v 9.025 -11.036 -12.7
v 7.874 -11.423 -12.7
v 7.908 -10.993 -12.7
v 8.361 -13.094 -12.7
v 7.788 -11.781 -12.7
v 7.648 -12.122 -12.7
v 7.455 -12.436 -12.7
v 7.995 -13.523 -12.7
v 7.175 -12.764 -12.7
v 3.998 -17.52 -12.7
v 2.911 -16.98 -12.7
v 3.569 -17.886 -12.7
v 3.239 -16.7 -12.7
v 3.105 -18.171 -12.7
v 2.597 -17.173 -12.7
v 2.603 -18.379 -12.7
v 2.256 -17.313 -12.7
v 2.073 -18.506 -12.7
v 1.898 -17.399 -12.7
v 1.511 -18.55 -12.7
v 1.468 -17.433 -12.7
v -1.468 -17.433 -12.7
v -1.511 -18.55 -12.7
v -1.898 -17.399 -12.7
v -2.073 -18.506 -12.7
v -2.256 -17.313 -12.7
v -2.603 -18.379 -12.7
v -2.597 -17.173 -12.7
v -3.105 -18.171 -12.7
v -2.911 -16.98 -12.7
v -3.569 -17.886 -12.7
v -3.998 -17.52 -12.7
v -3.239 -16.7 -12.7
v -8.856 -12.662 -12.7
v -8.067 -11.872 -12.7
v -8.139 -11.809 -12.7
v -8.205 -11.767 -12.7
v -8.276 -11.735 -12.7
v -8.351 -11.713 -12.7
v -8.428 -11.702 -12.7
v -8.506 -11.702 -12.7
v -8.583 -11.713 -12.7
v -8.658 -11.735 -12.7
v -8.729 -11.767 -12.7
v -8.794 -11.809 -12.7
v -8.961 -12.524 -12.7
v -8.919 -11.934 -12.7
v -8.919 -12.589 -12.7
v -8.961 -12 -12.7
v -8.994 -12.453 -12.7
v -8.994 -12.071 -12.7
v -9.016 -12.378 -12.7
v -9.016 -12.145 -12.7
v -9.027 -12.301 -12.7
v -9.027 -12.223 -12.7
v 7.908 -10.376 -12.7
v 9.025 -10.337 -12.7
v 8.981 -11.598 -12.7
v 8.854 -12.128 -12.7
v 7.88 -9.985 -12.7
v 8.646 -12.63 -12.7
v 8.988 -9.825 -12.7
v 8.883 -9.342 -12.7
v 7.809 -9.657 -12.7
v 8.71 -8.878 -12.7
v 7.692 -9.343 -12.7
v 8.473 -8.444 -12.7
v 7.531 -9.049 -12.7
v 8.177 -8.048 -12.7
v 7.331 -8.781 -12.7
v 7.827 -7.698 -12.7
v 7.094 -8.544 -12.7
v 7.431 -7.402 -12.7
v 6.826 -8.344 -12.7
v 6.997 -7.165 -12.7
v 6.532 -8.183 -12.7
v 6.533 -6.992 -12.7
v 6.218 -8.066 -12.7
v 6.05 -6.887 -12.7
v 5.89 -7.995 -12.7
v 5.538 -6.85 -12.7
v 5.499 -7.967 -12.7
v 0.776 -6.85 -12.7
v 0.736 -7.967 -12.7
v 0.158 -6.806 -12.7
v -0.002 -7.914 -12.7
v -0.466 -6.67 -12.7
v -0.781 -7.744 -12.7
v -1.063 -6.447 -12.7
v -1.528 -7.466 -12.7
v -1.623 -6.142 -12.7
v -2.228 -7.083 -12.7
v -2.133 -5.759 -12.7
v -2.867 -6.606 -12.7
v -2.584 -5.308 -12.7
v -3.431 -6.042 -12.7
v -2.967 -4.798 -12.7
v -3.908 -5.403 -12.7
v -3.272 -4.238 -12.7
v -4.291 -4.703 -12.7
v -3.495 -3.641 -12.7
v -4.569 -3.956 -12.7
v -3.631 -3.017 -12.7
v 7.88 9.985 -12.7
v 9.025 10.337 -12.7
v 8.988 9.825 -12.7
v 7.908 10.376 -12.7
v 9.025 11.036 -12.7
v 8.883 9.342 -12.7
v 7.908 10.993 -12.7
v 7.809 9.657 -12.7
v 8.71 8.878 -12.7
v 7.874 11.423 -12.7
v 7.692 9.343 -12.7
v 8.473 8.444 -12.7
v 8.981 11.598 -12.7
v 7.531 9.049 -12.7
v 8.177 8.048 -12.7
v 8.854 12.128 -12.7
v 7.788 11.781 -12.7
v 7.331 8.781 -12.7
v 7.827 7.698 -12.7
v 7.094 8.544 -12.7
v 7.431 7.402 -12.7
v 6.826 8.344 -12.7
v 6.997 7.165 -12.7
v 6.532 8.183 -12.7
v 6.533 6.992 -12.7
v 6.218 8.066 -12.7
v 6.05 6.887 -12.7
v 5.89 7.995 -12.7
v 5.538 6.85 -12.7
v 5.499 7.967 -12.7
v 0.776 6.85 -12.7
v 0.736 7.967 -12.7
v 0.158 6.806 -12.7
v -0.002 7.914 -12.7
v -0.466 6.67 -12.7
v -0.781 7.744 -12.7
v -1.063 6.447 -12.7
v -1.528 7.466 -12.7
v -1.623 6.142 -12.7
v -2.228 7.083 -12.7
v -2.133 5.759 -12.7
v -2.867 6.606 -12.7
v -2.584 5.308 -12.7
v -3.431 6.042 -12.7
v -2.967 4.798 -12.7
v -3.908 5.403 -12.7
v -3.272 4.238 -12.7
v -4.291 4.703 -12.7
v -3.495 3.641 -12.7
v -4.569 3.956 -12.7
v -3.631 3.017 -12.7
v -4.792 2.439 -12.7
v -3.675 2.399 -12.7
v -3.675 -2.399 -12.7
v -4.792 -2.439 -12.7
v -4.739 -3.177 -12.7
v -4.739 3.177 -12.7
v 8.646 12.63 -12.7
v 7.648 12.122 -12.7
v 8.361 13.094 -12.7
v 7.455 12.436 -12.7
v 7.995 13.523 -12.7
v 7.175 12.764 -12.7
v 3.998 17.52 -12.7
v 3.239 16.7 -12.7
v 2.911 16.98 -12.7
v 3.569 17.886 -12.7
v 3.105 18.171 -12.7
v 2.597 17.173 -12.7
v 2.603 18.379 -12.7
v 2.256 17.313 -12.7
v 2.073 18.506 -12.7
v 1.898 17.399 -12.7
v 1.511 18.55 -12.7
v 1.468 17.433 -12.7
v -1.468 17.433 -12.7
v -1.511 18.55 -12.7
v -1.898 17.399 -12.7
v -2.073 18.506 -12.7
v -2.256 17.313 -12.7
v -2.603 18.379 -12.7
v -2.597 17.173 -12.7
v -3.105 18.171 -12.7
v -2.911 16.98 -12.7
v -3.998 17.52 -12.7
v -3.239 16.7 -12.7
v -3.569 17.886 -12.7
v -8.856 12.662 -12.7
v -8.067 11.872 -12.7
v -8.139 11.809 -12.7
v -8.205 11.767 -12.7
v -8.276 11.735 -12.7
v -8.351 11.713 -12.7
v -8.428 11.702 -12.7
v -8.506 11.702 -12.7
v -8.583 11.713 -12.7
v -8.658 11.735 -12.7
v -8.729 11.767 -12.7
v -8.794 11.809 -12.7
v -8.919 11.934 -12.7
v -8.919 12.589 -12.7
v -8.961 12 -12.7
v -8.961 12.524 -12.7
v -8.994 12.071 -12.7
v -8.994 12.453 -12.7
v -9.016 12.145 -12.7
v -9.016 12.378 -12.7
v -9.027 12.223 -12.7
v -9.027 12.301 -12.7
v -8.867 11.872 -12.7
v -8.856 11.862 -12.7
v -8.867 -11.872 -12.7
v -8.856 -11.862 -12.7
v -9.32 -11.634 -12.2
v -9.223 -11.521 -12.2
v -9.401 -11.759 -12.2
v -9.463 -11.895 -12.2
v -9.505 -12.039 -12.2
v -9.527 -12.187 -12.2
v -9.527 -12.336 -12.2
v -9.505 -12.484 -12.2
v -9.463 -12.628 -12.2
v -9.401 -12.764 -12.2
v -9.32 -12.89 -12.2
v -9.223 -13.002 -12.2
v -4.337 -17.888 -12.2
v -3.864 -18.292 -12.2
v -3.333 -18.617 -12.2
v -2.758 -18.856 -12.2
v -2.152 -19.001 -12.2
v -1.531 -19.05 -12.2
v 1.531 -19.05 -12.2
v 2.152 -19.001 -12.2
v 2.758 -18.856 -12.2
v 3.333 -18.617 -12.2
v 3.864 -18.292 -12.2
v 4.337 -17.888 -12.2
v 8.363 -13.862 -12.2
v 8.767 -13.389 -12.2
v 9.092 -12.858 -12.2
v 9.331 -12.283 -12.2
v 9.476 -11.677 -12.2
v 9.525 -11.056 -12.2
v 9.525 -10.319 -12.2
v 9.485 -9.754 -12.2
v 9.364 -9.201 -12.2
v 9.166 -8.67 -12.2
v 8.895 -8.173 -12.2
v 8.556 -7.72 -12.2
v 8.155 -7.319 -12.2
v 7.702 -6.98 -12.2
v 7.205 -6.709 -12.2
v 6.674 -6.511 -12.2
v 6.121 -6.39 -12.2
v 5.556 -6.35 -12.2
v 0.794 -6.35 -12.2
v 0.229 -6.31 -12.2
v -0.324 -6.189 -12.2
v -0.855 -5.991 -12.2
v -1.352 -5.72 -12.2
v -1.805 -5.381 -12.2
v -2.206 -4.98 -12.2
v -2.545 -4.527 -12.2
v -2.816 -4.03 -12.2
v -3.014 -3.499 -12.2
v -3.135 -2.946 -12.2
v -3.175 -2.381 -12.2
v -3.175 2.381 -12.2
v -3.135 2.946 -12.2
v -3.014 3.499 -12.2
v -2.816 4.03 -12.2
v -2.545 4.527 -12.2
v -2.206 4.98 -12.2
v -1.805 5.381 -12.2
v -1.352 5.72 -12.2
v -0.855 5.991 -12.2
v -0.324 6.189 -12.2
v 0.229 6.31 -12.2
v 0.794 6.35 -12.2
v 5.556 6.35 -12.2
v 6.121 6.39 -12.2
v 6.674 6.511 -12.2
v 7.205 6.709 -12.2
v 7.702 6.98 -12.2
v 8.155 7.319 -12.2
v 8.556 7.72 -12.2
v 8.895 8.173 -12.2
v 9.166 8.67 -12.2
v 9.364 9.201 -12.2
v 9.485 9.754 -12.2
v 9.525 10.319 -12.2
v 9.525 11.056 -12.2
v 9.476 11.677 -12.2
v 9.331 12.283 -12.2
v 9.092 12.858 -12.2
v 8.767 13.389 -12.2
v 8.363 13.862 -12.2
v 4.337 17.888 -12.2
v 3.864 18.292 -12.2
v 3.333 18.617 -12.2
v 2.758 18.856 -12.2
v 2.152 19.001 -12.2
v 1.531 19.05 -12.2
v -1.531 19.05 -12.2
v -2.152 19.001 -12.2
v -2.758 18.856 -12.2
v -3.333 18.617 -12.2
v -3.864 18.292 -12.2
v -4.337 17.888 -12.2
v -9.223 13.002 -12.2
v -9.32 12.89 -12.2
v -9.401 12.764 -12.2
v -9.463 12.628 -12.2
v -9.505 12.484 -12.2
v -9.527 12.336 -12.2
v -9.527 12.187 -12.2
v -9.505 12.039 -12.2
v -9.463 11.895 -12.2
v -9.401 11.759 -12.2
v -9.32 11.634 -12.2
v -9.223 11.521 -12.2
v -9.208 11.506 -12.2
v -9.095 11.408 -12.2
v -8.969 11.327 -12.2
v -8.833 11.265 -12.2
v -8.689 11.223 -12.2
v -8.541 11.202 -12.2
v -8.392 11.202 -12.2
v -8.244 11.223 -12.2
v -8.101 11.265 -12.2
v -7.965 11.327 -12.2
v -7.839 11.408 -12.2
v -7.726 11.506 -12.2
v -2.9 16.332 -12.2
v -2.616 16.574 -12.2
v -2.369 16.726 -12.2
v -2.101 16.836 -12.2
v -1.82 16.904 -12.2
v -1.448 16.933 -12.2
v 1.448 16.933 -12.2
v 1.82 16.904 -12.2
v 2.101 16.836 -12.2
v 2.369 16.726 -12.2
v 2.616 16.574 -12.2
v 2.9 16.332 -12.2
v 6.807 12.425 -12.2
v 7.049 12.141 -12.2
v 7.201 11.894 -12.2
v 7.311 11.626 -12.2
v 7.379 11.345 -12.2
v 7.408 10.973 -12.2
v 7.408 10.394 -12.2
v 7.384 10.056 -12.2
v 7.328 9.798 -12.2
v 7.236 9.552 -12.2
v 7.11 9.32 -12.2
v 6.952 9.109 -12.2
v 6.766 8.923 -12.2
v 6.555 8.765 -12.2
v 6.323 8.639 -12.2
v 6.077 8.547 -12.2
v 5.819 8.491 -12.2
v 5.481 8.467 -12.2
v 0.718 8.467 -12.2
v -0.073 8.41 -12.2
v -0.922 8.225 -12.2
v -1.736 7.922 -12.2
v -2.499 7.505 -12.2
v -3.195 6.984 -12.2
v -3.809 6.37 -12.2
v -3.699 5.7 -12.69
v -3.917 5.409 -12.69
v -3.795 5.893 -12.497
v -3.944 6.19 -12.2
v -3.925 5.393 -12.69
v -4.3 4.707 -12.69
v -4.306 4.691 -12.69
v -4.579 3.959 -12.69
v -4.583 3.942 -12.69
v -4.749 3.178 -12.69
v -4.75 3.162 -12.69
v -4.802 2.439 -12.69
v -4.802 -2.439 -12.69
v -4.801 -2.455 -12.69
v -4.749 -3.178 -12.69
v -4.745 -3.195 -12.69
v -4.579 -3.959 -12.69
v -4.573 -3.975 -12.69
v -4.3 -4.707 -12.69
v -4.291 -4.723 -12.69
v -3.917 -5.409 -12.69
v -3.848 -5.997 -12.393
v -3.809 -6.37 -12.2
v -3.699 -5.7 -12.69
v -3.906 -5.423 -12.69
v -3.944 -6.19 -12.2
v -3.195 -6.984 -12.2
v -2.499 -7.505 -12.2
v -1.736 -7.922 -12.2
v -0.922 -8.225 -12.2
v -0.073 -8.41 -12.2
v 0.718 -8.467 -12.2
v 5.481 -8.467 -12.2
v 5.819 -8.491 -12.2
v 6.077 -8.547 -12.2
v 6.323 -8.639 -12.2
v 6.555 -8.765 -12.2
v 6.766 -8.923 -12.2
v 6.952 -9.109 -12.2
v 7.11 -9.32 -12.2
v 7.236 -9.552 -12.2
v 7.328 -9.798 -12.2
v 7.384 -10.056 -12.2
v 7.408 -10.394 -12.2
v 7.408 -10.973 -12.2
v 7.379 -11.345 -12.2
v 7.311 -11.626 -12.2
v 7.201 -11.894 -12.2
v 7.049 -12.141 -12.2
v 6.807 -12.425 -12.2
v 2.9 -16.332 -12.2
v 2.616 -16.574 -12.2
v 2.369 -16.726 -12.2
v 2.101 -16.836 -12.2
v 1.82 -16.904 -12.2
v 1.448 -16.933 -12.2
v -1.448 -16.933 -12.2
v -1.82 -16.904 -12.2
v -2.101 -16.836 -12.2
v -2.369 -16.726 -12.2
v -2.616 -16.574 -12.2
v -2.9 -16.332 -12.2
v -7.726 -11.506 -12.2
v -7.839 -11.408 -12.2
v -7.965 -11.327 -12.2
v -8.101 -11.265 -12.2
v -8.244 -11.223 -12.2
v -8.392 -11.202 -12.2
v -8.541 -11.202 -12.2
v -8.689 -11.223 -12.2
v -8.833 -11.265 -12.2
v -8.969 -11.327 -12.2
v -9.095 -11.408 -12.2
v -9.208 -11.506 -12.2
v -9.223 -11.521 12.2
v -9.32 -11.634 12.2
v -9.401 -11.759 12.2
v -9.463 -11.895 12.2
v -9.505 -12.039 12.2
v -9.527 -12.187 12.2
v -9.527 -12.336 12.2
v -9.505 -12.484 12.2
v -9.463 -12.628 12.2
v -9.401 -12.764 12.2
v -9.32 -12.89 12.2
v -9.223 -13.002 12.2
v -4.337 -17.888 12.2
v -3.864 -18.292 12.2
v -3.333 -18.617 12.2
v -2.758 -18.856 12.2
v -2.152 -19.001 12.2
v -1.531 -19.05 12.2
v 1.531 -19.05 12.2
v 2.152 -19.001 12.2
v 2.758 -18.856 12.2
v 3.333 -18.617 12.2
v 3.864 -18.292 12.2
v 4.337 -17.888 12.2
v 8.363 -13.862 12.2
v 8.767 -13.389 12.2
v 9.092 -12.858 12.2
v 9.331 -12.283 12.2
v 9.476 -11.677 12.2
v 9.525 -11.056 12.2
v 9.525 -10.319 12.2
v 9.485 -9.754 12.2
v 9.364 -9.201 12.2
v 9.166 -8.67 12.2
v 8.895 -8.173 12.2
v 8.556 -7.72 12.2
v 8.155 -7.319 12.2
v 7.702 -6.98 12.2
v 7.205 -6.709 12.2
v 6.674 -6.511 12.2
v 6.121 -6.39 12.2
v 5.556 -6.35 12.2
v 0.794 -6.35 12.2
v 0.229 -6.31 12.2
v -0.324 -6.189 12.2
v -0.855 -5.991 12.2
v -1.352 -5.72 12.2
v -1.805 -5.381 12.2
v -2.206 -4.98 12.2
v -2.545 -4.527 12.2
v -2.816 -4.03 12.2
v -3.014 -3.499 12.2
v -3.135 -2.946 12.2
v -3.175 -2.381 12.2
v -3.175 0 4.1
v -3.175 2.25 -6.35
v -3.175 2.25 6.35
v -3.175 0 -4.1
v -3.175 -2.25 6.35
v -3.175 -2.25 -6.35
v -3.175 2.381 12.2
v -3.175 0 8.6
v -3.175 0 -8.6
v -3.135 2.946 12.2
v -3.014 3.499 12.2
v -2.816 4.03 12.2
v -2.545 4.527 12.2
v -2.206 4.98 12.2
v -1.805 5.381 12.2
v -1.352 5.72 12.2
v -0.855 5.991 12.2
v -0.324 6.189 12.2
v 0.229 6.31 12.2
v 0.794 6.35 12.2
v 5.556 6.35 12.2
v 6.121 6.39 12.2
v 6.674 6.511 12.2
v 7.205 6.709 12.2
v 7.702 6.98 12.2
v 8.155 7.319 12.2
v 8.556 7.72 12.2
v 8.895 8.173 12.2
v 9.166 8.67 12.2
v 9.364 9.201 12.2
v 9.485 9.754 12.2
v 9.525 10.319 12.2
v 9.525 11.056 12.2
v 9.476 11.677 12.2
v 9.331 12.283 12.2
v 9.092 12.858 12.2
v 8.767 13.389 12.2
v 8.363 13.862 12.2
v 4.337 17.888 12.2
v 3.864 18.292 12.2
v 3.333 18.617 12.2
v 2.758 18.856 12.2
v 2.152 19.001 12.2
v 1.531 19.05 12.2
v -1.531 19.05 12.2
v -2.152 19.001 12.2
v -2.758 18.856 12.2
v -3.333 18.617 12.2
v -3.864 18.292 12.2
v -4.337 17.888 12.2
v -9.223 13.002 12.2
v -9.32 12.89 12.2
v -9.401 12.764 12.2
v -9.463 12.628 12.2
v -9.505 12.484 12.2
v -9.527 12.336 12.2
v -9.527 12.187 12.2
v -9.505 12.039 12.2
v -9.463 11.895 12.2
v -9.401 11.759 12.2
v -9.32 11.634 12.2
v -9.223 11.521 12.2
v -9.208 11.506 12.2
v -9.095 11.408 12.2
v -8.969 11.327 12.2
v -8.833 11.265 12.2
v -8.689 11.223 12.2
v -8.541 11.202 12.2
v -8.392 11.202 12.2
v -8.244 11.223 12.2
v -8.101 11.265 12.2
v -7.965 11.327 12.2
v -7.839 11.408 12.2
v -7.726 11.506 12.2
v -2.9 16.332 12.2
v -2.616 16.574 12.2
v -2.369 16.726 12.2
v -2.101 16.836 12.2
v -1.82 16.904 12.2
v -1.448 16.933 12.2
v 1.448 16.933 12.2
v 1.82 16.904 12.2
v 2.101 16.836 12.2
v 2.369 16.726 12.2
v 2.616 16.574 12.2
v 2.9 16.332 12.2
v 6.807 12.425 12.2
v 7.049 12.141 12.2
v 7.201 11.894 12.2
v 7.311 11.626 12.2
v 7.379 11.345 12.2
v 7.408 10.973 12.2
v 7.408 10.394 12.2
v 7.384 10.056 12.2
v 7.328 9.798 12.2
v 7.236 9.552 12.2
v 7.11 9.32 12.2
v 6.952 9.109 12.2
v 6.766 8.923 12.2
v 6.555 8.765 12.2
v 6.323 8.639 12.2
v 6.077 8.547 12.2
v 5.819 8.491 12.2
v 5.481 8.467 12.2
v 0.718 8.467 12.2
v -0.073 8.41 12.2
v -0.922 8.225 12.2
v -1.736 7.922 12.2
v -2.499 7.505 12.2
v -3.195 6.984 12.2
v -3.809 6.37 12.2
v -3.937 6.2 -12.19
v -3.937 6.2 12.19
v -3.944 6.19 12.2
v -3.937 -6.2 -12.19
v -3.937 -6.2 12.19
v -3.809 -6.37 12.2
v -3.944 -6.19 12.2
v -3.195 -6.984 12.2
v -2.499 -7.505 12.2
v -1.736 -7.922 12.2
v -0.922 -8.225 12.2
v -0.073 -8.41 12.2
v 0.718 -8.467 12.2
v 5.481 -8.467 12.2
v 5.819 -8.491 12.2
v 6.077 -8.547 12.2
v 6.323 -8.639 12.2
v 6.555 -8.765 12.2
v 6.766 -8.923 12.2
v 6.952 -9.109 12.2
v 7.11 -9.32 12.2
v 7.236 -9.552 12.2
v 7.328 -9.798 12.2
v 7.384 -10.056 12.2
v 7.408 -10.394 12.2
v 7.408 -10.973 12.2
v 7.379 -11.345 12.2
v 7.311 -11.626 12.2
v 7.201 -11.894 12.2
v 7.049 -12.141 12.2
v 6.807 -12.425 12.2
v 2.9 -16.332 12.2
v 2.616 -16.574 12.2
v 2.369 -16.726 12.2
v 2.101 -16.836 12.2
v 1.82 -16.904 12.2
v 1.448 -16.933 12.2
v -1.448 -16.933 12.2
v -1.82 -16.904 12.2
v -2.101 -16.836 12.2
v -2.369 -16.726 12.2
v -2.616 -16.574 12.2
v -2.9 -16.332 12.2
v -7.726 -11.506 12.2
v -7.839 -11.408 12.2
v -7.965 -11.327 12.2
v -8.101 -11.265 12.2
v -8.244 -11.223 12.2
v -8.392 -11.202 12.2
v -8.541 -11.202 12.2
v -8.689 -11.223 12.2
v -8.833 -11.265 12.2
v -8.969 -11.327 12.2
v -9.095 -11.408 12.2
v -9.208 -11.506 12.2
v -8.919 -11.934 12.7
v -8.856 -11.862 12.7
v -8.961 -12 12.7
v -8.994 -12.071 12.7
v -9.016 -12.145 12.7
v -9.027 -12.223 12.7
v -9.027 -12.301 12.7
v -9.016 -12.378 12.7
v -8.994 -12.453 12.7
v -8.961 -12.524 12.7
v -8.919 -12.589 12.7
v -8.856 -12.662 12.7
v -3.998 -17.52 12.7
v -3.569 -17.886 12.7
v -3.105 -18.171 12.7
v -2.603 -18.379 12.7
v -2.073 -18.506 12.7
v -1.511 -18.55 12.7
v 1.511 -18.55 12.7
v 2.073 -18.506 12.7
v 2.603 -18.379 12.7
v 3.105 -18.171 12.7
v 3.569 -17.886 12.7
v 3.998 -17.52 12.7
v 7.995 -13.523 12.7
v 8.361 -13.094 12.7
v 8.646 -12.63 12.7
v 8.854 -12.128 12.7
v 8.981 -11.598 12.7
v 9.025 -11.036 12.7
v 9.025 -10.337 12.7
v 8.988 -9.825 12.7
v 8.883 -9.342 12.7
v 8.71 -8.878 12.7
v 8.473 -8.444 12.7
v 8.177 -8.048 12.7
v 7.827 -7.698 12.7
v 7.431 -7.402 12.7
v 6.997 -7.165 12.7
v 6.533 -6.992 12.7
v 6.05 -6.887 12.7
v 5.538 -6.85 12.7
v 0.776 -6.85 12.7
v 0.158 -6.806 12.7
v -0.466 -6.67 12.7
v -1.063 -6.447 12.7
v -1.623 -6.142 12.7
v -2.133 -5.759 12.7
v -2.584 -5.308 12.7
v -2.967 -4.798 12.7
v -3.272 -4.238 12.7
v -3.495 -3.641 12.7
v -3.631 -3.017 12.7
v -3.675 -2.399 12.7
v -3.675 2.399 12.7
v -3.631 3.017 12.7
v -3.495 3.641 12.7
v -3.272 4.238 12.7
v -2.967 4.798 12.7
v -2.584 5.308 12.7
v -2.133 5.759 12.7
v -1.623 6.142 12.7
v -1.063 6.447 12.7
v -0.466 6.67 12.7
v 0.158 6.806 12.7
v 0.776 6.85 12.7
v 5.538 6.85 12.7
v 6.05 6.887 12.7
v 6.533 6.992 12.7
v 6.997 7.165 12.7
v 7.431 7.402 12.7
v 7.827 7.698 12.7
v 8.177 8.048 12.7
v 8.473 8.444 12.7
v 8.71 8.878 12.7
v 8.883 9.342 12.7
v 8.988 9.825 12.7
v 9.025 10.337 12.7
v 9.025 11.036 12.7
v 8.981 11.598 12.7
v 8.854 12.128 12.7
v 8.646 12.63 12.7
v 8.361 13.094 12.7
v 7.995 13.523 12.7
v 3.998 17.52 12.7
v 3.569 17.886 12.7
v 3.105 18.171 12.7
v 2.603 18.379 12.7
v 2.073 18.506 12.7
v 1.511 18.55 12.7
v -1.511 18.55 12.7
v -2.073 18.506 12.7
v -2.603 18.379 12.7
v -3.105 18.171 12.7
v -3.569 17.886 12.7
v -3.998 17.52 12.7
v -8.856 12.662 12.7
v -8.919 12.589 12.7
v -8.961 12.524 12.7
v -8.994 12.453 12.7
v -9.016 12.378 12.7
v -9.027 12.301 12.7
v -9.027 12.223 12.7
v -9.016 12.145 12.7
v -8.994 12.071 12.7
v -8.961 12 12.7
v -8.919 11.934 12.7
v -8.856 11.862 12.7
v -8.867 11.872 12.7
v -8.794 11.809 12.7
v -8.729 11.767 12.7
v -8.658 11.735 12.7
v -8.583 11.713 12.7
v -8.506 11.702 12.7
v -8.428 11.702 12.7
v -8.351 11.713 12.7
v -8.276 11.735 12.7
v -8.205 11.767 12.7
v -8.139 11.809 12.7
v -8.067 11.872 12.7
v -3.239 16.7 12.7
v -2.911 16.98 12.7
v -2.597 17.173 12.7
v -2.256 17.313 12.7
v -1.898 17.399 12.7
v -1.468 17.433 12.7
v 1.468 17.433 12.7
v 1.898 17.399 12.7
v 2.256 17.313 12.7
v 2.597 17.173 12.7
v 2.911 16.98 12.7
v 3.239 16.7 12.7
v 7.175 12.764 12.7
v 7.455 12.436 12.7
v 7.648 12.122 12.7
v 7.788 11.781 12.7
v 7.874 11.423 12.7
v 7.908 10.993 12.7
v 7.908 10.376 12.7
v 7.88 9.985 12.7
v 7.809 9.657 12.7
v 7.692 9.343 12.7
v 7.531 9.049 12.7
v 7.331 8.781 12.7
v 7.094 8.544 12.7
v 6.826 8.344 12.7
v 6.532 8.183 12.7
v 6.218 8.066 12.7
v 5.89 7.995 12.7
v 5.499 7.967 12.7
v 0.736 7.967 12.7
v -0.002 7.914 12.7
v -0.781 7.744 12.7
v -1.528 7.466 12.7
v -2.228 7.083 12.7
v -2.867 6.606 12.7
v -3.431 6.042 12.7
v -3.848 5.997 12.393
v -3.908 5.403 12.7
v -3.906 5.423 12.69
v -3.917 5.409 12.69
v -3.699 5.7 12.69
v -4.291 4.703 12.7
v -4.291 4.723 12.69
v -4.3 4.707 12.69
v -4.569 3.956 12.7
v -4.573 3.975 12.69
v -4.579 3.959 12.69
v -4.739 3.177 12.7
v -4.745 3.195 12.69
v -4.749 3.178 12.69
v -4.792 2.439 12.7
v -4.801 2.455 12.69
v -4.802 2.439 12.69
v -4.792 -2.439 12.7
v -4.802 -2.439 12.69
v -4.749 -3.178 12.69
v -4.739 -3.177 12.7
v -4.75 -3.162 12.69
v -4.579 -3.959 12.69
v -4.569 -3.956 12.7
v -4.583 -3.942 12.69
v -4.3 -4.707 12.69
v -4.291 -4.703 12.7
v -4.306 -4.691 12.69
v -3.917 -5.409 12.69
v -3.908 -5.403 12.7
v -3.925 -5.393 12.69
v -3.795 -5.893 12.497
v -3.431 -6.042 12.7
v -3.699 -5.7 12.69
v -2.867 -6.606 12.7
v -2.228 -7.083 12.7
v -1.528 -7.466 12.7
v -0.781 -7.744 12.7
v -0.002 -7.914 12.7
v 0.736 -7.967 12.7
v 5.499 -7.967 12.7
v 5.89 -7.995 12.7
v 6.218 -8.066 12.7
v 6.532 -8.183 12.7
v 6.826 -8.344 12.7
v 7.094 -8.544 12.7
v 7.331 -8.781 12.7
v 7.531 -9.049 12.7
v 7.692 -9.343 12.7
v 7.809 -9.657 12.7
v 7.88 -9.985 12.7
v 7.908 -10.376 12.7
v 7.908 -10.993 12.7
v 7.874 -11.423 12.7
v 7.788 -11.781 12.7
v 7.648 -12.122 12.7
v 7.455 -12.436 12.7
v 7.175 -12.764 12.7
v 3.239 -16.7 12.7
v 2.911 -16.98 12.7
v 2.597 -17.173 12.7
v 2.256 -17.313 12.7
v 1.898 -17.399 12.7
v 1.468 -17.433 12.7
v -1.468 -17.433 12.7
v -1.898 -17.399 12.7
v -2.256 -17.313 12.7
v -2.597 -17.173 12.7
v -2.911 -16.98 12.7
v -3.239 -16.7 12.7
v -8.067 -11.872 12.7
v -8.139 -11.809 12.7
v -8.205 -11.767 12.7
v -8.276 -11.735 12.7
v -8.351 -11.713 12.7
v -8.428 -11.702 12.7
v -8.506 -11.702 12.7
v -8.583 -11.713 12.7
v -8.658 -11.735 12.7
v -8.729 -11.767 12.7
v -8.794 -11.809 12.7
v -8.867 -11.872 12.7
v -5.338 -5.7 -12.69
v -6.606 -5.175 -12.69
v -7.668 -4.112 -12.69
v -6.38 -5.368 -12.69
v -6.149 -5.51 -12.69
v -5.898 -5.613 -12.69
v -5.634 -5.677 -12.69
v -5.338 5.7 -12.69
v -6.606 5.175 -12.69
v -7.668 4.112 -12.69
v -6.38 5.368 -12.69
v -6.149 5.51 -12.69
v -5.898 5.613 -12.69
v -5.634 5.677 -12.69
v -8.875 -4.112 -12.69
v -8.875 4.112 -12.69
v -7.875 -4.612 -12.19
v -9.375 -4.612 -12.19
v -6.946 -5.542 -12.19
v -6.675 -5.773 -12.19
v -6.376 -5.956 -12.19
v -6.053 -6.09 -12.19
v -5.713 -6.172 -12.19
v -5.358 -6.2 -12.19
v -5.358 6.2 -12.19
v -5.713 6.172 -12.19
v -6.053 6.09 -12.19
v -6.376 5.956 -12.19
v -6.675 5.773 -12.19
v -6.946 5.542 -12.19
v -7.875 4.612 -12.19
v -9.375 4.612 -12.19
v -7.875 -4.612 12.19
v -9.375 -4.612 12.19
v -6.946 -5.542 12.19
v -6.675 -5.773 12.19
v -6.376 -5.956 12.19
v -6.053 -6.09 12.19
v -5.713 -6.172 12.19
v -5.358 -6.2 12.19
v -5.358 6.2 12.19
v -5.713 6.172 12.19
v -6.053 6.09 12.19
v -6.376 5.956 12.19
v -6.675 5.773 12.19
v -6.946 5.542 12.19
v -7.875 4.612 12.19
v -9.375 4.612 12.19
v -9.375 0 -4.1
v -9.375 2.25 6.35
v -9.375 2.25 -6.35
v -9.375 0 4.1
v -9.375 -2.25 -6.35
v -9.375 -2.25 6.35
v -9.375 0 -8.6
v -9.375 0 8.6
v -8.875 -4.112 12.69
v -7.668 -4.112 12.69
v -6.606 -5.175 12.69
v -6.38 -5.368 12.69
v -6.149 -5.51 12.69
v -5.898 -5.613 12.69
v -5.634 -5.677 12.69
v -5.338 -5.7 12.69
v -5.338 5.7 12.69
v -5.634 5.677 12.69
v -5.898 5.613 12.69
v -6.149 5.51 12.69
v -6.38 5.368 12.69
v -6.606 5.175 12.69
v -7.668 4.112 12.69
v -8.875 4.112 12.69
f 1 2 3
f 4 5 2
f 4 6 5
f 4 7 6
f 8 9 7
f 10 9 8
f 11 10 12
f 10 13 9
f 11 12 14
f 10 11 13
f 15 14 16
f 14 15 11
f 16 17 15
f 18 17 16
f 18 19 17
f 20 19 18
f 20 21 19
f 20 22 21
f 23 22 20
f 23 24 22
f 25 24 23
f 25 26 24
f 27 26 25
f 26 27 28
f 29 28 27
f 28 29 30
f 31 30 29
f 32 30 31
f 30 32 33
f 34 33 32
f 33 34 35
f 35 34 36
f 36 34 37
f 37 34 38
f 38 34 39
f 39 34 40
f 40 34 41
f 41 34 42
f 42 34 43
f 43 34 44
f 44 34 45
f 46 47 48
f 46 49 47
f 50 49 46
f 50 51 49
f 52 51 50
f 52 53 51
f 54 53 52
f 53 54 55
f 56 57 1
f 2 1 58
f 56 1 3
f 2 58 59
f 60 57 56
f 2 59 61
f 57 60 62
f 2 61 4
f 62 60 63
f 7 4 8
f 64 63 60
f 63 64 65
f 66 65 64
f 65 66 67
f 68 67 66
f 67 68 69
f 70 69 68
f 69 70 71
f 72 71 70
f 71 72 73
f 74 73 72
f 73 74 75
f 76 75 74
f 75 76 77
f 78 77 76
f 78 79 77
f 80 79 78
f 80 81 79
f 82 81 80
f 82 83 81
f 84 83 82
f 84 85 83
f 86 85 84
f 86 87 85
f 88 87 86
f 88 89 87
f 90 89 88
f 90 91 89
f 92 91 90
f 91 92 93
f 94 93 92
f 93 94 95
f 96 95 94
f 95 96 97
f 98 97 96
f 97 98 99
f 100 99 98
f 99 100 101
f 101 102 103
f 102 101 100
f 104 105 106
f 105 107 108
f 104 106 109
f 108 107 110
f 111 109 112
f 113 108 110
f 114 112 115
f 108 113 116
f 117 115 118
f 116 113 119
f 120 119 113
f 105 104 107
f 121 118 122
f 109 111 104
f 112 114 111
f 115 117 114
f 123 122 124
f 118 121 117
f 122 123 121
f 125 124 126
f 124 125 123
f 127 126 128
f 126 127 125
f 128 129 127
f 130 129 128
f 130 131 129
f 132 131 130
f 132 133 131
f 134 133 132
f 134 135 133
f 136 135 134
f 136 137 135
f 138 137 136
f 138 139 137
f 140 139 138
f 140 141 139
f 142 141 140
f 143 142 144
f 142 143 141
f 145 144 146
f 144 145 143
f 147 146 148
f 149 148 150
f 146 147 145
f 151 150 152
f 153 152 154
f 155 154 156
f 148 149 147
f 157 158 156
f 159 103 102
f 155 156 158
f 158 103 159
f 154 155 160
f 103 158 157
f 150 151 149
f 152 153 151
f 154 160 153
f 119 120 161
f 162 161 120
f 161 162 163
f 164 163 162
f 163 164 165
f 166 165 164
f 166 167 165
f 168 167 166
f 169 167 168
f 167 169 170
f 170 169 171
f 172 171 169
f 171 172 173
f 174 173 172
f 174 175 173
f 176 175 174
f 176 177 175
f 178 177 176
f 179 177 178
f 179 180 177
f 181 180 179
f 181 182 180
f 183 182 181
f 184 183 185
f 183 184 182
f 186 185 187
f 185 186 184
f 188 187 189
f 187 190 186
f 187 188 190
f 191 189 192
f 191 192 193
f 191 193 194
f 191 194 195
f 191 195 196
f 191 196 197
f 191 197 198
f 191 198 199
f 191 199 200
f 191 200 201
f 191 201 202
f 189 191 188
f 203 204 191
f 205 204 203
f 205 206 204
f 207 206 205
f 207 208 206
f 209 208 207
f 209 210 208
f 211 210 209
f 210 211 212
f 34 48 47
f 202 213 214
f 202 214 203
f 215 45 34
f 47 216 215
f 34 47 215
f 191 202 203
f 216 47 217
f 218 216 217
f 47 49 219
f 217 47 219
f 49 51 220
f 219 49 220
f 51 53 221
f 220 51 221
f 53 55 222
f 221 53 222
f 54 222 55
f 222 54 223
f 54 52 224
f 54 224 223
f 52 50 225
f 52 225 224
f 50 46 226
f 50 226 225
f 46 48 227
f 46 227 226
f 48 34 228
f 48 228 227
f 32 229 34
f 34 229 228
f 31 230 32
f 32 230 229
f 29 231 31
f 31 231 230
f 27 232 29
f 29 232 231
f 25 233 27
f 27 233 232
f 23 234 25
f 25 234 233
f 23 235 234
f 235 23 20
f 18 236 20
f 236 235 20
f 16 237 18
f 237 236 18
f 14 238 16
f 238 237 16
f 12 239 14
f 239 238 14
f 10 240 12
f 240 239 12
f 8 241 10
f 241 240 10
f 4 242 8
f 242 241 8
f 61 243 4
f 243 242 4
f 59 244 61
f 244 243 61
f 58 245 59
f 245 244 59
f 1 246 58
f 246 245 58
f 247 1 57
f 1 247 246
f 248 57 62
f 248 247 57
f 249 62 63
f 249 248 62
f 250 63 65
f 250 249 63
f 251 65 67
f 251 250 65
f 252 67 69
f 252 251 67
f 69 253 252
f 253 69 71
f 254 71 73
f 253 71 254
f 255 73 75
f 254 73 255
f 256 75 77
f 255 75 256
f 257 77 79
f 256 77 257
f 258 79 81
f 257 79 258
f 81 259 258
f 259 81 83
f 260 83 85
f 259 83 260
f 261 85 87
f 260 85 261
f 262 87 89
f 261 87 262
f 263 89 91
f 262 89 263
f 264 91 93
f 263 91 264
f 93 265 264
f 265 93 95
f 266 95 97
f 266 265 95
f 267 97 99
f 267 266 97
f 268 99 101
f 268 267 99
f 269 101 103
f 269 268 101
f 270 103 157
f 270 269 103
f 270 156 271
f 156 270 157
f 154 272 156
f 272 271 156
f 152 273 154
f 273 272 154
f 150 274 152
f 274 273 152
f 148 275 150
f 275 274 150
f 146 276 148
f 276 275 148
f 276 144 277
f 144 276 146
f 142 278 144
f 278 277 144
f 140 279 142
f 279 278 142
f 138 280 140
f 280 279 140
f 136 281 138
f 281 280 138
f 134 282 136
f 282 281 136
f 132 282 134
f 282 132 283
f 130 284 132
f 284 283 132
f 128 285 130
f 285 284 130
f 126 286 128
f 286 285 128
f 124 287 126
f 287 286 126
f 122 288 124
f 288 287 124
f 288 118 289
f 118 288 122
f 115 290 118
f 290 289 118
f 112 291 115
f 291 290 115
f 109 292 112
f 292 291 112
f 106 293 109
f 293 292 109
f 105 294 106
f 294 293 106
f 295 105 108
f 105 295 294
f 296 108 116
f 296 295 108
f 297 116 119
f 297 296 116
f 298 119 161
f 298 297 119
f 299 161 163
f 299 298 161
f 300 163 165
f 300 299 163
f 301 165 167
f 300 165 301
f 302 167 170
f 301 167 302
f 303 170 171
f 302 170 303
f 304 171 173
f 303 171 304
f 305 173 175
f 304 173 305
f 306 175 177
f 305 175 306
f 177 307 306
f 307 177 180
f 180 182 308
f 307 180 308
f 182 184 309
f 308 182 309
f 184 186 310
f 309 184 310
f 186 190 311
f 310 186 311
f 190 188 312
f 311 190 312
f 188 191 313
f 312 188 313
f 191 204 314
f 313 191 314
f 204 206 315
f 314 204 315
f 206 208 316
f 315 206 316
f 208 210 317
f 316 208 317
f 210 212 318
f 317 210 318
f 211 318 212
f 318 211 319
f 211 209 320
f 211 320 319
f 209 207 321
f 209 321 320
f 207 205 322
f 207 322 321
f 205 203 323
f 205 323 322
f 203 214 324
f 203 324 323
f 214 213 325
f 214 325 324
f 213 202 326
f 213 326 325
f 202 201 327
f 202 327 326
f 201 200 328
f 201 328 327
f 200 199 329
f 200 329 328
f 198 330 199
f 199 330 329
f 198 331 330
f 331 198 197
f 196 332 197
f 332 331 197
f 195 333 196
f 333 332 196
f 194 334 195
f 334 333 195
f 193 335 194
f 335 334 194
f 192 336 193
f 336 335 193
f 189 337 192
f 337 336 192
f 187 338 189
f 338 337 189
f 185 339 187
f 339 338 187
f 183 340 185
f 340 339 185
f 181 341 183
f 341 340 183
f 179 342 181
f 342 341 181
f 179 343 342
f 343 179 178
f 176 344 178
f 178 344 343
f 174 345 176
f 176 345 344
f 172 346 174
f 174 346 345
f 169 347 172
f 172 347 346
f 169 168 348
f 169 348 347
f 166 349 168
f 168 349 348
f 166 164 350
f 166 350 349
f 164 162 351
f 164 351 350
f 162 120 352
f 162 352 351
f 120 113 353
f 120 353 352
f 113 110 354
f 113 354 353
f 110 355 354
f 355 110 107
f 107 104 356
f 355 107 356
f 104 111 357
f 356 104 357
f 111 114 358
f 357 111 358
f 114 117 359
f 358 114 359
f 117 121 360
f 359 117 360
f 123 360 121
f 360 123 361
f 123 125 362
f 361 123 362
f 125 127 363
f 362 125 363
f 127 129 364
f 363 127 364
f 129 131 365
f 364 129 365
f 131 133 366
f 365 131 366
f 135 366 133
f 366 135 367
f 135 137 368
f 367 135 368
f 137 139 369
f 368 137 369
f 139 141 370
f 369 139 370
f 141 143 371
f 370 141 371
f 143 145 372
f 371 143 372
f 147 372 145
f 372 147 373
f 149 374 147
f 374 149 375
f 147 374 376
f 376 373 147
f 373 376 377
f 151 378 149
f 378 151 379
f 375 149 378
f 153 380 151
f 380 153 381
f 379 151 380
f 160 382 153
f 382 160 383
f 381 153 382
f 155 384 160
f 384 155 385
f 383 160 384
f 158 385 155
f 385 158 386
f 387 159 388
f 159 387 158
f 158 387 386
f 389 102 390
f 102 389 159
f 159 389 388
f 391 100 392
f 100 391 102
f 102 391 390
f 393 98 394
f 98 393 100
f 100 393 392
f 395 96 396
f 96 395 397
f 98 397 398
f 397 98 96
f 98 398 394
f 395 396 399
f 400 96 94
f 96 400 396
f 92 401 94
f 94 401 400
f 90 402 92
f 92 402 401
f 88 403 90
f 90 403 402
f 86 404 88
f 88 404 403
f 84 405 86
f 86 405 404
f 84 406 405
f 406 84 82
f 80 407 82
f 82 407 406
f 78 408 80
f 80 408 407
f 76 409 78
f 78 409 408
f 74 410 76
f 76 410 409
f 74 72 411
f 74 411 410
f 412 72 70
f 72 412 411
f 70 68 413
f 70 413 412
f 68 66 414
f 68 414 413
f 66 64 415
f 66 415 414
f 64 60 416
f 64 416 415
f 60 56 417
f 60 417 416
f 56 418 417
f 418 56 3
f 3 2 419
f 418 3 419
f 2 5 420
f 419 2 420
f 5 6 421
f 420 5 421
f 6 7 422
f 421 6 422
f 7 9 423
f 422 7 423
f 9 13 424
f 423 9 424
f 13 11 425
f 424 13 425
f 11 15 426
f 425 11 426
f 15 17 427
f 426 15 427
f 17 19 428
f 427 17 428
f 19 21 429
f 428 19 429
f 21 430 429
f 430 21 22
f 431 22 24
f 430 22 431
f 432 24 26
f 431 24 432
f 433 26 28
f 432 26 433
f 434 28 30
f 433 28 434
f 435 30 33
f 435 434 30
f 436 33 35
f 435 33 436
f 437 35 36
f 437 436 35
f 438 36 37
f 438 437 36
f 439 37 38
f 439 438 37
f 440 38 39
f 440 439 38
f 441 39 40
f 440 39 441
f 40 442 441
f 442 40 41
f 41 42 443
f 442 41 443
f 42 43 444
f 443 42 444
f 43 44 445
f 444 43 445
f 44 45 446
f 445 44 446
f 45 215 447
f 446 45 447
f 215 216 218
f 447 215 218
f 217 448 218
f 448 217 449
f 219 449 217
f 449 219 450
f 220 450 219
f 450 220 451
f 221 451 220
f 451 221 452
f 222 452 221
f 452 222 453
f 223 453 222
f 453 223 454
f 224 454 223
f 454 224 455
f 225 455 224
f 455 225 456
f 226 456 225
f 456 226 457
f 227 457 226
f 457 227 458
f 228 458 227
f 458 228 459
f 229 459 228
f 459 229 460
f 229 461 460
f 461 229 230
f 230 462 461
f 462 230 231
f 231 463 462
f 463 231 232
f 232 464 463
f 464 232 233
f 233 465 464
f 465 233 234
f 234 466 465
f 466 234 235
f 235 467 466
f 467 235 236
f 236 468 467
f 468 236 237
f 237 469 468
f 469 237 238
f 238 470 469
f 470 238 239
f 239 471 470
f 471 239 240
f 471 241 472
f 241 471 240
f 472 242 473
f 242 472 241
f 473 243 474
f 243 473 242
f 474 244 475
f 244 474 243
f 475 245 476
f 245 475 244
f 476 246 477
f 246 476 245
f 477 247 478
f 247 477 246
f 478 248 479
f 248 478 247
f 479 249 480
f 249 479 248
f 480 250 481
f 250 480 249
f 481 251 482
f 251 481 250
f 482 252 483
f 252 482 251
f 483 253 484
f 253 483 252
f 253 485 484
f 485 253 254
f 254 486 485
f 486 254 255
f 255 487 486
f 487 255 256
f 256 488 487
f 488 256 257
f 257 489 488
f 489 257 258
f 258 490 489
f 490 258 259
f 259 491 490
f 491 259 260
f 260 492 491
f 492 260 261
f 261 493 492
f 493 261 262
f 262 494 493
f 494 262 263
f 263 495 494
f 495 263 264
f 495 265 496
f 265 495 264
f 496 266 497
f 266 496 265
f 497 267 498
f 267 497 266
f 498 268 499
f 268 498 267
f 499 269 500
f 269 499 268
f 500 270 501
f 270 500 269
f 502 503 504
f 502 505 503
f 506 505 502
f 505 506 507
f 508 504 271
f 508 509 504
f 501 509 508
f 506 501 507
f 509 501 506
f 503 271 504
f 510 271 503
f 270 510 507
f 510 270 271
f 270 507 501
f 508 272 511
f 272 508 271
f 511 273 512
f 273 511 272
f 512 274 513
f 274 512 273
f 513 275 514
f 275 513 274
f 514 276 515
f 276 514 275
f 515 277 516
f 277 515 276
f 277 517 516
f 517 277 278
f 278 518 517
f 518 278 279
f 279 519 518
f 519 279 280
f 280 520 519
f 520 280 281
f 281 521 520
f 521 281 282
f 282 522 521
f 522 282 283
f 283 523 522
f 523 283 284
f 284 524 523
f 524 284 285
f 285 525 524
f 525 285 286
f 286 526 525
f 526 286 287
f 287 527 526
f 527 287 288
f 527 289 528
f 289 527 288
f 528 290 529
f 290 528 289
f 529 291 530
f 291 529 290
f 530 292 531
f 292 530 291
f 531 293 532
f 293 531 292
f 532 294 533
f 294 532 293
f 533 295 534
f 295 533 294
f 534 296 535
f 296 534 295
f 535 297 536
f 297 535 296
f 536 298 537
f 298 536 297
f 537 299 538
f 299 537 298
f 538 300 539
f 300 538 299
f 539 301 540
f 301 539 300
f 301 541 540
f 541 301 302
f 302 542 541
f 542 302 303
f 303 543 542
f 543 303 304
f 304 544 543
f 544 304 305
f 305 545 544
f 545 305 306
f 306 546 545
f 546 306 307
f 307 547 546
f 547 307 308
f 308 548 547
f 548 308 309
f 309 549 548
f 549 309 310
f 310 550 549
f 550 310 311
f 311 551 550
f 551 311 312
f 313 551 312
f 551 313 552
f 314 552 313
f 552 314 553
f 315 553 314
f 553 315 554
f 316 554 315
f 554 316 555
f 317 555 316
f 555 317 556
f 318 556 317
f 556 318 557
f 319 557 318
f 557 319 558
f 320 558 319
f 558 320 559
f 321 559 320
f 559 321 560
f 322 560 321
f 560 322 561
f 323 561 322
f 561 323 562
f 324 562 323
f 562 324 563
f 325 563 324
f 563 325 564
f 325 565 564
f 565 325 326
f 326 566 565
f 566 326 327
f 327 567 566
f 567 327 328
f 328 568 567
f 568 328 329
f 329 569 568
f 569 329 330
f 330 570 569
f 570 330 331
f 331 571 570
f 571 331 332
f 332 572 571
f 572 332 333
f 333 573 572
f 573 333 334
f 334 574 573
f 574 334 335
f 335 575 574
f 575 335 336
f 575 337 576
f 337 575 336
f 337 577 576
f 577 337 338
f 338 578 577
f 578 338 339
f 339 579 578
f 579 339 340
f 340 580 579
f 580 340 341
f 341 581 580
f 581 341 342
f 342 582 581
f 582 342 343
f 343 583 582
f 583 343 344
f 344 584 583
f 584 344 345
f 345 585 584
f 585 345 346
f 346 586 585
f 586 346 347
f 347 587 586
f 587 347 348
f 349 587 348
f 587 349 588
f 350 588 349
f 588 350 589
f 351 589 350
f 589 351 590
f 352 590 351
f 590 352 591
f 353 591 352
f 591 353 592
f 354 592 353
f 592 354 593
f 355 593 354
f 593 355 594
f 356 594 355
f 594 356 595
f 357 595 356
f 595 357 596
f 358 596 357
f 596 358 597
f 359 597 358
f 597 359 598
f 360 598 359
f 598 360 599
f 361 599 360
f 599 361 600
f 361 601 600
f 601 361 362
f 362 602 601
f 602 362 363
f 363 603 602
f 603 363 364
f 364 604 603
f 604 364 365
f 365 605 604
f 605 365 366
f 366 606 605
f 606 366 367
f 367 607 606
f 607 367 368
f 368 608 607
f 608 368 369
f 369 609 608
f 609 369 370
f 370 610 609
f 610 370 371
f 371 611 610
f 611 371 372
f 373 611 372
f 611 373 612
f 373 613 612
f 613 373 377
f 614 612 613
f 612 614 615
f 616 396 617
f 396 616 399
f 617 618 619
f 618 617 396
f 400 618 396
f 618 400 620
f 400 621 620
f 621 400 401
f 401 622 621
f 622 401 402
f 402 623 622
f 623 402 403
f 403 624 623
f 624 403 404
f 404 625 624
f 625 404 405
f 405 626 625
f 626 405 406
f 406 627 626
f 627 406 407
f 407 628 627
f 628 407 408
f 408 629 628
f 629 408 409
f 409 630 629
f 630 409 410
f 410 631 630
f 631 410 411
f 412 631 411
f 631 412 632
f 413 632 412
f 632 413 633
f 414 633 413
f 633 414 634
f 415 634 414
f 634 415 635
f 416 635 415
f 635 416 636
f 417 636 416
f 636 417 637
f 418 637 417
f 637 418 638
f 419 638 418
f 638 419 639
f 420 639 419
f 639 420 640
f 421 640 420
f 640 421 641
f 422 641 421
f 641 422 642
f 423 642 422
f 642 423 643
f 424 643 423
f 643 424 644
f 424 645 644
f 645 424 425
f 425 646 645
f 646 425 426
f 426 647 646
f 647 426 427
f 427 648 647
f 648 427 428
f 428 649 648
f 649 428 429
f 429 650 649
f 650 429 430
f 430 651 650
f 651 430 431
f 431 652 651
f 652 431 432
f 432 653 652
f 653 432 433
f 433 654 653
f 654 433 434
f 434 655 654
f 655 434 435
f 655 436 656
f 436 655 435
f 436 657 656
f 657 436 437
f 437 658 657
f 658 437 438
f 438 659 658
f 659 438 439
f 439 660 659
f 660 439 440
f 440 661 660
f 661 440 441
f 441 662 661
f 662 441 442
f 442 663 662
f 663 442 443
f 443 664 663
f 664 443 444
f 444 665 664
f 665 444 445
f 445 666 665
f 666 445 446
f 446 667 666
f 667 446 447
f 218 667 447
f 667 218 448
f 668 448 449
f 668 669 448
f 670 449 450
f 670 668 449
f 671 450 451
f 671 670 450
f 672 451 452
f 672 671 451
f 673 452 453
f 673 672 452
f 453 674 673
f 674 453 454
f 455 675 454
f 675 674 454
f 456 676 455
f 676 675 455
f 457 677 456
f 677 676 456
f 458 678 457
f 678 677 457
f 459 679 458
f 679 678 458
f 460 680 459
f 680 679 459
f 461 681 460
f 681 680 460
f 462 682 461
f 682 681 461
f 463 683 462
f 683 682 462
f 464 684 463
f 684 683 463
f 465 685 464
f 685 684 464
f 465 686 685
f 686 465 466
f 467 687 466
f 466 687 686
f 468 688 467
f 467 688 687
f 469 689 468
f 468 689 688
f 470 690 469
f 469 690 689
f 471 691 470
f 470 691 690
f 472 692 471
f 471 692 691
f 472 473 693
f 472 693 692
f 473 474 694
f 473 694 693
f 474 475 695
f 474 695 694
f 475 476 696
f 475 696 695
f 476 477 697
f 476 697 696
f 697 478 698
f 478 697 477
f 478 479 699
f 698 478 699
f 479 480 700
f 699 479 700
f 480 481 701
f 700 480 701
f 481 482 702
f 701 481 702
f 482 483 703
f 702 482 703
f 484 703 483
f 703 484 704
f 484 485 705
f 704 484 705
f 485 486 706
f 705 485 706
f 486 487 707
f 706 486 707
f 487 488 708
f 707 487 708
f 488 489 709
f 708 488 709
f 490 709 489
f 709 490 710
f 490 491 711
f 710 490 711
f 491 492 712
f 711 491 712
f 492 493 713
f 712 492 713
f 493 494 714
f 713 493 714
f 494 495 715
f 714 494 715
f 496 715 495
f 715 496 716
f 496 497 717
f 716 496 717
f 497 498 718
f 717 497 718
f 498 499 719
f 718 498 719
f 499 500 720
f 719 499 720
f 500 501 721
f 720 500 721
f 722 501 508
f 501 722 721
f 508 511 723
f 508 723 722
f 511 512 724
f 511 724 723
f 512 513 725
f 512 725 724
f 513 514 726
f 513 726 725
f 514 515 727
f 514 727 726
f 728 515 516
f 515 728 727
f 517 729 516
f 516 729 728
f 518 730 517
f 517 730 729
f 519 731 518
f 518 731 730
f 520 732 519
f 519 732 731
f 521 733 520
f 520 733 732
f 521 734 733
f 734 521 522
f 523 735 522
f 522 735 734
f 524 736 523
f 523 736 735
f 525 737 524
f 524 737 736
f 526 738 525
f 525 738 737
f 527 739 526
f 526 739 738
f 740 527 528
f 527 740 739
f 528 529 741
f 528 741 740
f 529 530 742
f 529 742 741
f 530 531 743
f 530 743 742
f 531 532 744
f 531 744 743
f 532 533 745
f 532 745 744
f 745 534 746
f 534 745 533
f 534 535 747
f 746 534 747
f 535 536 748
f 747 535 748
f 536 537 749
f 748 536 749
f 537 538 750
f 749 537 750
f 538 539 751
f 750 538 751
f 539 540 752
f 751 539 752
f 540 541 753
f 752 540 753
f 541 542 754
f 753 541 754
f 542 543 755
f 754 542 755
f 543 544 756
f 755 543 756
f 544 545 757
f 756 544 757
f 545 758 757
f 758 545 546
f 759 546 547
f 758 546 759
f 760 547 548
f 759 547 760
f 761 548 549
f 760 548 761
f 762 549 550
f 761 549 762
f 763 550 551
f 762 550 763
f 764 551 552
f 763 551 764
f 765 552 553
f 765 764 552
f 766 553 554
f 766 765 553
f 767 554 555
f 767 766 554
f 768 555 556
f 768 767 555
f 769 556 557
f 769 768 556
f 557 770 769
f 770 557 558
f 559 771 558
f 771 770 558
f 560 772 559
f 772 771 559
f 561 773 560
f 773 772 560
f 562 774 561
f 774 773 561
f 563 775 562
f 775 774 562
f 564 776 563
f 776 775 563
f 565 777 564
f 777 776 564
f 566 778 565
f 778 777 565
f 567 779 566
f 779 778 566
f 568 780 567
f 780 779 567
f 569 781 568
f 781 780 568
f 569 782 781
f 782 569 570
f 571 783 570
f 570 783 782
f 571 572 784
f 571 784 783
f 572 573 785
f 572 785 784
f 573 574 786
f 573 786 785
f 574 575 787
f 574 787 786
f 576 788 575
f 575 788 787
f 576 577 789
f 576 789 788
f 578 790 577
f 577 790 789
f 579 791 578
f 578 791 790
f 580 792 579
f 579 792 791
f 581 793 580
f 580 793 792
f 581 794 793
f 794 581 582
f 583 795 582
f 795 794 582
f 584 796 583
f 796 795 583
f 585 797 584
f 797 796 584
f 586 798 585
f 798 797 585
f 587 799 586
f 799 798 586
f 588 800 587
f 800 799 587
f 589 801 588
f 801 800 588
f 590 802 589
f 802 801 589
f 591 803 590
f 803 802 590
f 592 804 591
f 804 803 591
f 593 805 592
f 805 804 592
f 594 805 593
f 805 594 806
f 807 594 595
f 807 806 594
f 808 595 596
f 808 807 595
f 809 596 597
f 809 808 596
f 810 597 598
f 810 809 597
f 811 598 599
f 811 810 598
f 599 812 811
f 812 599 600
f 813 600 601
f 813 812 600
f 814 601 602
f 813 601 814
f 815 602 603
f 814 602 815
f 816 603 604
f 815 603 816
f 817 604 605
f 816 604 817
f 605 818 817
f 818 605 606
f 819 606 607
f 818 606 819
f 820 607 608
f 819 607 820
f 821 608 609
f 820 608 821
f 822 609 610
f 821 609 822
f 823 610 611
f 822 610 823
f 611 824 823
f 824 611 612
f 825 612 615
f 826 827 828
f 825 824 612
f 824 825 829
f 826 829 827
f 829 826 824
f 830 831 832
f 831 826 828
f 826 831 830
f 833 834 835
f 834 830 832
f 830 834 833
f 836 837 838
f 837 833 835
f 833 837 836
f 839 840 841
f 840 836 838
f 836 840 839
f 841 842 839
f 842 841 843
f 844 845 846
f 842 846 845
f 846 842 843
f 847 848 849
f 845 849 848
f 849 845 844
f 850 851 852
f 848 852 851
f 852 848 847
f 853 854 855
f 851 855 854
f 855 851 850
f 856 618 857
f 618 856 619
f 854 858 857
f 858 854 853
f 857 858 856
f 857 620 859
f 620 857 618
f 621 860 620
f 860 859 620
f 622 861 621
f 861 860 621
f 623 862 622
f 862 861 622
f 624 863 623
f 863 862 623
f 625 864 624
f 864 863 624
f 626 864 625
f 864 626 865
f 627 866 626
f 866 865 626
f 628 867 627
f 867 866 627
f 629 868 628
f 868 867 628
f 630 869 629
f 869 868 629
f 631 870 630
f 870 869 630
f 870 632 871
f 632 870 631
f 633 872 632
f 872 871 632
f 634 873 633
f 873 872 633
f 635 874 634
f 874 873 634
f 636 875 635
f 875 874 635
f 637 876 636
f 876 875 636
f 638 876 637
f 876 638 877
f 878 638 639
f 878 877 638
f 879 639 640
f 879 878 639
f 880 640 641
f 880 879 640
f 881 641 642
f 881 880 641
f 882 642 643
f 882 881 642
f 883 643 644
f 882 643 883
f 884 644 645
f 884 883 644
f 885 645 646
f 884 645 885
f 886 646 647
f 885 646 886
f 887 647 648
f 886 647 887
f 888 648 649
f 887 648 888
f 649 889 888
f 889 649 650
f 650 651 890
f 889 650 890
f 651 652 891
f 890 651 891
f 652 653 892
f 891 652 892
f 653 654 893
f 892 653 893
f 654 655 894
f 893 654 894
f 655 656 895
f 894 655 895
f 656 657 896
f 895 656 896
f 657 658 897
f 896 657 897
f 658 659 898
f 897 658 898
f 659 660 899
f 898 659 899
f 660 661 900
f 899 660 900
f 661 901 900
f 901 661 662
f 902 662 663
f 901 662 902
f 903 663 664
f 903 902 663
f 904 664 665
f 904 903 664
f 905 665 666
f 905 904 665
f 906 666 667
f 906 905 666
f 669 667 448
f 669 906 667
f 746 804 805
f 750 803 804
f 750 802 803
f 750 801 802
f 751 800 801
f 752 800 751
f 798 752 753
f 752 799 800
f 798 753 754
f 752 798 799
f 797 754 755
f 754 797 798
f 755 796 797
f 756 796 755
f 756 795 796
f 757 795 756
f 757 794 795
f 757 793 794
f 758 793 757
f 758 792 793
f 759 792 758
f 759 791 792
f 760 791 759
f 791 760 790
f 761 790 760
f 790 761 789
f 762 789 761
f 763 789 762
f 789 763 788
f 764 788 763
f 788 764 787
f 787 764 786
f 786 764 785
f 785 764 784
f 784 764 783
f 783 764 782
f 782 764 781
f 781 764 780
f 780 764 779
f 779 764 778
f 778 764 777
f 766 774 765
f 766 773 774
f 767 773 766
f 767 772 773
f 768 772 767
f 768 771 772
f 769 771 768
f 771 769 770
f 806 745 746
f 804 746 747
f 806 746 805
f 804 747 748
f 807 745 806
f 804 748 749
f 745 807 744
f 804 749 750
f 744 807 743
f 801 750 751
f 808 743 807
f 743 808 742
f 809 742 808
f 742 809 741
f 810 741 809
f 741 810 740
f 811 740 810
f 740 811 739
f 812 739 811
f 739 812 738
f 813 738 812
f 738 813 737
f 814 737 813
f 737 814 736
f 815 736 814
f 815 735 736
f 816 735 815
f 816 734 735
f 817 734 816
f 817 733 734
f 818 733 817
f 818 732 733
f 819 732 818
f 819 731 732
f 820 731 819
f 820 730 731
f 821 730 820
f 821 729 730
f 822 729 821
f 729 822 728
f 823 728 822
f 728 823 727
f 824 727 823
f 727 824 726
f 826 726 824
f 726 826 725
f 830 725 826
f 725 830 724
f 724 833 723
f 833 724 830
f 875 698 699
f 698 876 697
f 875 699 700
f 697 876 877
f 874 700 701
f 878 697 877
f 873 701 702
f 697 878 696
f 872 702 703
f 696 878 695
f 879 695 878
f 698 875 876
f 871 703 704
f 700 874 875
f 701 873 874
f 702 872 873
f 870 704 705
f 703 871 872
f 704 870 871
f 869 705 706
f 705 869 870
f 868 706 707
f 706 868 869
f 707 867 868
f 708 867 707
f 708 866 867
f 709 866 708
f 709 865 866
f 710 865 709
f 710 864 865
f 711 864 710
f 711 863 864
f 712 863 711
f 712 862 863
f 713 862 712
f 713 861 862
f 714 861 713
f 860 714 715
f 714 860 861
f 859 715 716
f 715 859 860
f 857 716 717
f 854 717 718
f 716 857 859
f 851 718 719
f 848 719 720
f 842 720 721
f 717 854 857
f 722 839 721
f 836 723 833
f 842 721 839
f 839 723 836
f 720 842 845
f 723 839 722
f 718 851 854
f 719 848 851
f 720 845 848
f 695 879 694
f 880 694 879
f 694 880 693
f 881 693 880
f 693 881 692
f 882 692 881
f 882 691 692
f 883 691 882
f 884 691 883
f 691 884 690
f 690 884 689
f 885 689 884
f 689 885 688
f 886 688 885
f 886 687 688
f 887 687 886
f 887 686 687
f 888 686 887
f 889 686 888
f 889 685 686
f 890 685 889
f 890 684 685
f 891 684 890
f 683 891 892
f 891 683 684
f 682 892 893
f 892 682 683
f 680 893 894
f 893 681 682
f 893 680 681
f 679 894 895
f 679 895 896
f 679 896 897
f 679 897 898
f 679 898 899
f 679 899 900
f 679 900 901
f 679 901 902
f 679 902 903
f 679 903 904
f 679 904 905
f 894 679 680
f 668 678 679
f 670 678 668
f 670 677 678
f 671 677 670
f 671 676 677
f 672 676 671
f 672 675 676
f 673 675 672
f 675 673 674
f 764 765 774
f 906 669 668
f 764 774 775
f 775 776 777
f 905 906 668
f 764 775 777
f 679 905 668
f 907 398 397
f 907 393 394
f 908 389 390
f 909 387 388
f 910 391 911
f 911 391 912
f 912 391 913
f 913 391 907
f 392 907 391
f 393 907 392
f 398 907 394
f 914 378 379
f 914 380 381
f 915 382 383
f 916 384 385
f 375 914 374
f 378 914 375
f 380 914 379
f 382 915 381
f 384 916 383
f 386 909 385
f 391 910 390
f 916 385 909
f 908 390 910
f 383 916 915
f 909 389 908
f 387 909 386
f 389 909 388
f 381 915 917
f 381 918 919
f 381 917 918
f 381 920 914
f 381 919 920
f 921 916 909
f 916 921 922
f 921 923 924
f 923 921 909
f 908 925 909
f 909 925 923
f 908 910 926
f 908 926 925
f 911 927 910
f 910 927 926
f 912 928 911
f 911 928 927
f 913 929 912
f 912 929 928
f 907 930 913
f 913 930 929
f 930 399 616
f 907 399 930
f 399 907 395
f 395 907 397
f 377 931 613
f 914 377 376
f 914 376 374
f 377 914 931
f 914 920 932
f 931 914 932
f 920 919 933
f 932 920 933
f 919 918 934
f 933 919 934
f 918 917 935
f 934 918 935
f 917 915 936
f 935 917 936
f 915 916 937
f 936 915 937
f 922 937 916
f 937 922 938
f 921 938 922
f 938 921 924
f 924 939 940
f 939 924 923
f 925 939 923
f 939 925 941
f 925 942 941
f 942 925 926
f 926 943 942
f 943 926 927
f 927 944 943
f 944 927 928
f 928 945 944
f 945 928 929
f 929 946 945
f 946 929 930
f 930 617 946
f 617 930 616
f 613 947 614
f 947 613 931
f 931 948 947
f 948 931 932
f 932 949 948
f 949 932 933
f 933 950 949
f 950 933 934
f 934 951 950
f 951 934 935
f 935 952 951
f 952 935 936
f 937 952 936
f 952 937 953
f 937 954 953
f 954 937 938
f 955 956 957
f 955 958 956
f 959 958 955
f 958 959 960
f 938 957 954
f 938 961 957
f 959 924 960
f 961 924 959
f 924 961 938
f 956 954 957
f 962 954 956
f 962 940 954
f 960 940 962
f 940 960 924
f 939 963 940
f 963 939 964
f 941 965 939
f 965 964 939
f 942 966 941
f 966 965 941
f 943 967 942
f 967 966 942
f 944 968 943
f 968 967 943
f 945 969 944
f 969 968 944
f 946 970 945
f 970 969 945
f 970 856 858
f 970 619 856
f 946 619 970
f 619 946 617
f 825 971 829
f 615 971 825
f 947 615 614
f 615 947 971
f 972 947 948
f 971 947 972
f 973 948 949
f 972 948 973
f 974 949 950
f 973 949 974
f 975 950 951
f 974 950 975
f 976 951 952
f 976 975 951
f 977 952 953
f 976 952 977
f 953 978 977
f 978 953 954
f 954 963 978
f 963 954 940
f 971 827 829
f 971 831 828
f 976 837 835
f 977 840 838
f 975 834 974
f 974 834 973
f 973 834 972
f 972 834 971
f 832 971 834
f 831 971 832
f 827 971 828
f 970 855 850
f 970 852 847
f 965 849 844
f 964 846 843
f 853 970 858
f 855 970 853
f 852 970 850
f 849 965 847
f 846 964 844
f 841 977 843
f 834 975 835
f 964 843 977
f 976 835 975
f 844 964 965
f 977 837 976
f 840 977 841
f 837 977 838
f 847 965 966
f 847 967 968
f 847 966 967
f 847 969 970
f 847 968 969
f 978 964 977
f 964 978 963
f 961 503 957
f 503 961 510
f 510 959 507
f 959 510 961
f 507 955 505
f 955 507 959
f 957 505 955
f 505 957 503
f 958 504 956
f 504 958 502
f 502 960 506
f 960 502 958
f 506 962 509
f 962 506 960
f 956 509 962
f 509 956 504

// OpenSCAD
// FCSubClip0.2
// 
// v0.2:
// - Different shape

thickness = "1/12inch";
width = "1inch";
end_bevel = "0.5mm";
$tgx11_offset = -0.15;
$fn = 48;

module __fcsubclip0__end_params() { }

use <../lib/TOGMod1.scad>
use <../lib/TOGMod1Constructors.scad>
use <../lib/TOGPath1.scad>
use <../lib/TOGUnits1.scad>
use <../lib/TOGPolyhedronLib1.scad>

u     = togunits1_to_mm("1u");
2u    = togunits1_to_mm("1/8inch");
atom  = togunits1_to_mm("atom");

thickness_mm = togunits1_to_mm(thickness);
vbev_mm      = min(thickness_mm/3, togunits1_to_mm(end_bevel));
width_mm     = togunits1_to_mm(width);
width_atoms  = togunits1_decode(width, unit="atom", xf="round");

identity = function(x) x;

reverse_list = function(list) [for(i=[len(list)-1 : -1 : 0]) list[i]];

togpath1_make_rathnode_position_transform = function(position_transform)
	function(node) [node[0], position_transform(node[1]), for(i=[2:1:len(node)-1]) node[i]];

mkmap = function(xf) function(list) [for(item=list) xf(item)];

compose = function(a,b) function(x) a(b(x));

outer_rath = ["togpath1-rath",
	for( transform=[
		identity,
		compose(reverse_list, mkmap(togpath1_make_rathnode_position_transform( function(p) [p[0], -p[1]])))
	])
	each transform([
		["togpath1-rathnode", [-3*2u,-4*2u]],
		["togpath1-rathnode", [-1*2u,-6*2u], ["round", 2.5*u]],
		["togpath1-rathnode", [ 1*2u,-6*2u], ["round", 2.5*u]],
		["togpath1-rathnode", [ 3*2u,-4*2u], ["round", 2.5*u]],
		["togpath1-rathnode", [ 3*2u,-2*2u], ["round", 2.5*u]],
		["togpath1-rathnode", [-1*2u,-2*2u], ["round", 2.5*u]],
	])
];

polyline_rath = togpath1_offset_rath(outer_rath, -thickness_mm/2);
polyline_points = togpath1_rath_to_polypoints(polyline_rath);

polyline_outline_rath = togpath1_polyline_to_rath(polyline_points, thickness_mm/2);
core_rath = togpath1_offset_rath(["togpath1-rath",
	for( transform=[
		identity,
		compose(reverse_list, mkmap(togpath1_make_rathnode_position_transform( function(p) [p[0], -p[1]])))
	])
	each transform([
		["togpath1-rathnode", [-6*u, -3*u]],
		["togpath1-rathnode", [-5*u, -3*u]],
		["togpath1-rathnode", [-4*u, -4*u], ["round", 1.5*u]],
		["togpath1-rathnode", [-1*u, -4*u]],
		["togpath1-rathnode", [-2*u, -3*u]],
	])
], $tgx11_offset);

hole = togmod1_linear_extrude_x([-100,100], togmod1_make_circle(d=4.5, $fn=4));

function le_extrude_rath(zos, rath) =
	tphl1_make_polyhedron_from_layer_function(
		zos,
		function(zo) togpath1_rath_to_polypoints(togpath1_offset_rath(rath, zo[1])),
		layer_points_transform = "key0-to-z"
	);

function z_offset_zos(z_offset, zos) = [for(zo=zos) [zo[0] + z_offset*(zo[0]/abs(zo[0])), zo[1]]];

togmod1_domodule(
	let( extrusion_zos = [
		[-width_mm/2          , -vbev_mm],
		[-width_mm/2 + vbev_mm,        0],
		[ width_mm/2 - vbev_mm,        0],
		[ width_mm/2          , -vbev_mm],
	])
	["difference",
		["union",
			le_extrude_rath(z_offset_zos( 0.00, extrusion_zos), polyline_outline_rath),
			le_extrude_rath(z_offset_zos(-0.01, extrusion_zos), core_rath),
		],
		
		for( zm=[-width_atoms/2 + 0.5 : 1 : width_atoms/2] )
		["translate", [0,0,zm*atom], hole],
	]
);
